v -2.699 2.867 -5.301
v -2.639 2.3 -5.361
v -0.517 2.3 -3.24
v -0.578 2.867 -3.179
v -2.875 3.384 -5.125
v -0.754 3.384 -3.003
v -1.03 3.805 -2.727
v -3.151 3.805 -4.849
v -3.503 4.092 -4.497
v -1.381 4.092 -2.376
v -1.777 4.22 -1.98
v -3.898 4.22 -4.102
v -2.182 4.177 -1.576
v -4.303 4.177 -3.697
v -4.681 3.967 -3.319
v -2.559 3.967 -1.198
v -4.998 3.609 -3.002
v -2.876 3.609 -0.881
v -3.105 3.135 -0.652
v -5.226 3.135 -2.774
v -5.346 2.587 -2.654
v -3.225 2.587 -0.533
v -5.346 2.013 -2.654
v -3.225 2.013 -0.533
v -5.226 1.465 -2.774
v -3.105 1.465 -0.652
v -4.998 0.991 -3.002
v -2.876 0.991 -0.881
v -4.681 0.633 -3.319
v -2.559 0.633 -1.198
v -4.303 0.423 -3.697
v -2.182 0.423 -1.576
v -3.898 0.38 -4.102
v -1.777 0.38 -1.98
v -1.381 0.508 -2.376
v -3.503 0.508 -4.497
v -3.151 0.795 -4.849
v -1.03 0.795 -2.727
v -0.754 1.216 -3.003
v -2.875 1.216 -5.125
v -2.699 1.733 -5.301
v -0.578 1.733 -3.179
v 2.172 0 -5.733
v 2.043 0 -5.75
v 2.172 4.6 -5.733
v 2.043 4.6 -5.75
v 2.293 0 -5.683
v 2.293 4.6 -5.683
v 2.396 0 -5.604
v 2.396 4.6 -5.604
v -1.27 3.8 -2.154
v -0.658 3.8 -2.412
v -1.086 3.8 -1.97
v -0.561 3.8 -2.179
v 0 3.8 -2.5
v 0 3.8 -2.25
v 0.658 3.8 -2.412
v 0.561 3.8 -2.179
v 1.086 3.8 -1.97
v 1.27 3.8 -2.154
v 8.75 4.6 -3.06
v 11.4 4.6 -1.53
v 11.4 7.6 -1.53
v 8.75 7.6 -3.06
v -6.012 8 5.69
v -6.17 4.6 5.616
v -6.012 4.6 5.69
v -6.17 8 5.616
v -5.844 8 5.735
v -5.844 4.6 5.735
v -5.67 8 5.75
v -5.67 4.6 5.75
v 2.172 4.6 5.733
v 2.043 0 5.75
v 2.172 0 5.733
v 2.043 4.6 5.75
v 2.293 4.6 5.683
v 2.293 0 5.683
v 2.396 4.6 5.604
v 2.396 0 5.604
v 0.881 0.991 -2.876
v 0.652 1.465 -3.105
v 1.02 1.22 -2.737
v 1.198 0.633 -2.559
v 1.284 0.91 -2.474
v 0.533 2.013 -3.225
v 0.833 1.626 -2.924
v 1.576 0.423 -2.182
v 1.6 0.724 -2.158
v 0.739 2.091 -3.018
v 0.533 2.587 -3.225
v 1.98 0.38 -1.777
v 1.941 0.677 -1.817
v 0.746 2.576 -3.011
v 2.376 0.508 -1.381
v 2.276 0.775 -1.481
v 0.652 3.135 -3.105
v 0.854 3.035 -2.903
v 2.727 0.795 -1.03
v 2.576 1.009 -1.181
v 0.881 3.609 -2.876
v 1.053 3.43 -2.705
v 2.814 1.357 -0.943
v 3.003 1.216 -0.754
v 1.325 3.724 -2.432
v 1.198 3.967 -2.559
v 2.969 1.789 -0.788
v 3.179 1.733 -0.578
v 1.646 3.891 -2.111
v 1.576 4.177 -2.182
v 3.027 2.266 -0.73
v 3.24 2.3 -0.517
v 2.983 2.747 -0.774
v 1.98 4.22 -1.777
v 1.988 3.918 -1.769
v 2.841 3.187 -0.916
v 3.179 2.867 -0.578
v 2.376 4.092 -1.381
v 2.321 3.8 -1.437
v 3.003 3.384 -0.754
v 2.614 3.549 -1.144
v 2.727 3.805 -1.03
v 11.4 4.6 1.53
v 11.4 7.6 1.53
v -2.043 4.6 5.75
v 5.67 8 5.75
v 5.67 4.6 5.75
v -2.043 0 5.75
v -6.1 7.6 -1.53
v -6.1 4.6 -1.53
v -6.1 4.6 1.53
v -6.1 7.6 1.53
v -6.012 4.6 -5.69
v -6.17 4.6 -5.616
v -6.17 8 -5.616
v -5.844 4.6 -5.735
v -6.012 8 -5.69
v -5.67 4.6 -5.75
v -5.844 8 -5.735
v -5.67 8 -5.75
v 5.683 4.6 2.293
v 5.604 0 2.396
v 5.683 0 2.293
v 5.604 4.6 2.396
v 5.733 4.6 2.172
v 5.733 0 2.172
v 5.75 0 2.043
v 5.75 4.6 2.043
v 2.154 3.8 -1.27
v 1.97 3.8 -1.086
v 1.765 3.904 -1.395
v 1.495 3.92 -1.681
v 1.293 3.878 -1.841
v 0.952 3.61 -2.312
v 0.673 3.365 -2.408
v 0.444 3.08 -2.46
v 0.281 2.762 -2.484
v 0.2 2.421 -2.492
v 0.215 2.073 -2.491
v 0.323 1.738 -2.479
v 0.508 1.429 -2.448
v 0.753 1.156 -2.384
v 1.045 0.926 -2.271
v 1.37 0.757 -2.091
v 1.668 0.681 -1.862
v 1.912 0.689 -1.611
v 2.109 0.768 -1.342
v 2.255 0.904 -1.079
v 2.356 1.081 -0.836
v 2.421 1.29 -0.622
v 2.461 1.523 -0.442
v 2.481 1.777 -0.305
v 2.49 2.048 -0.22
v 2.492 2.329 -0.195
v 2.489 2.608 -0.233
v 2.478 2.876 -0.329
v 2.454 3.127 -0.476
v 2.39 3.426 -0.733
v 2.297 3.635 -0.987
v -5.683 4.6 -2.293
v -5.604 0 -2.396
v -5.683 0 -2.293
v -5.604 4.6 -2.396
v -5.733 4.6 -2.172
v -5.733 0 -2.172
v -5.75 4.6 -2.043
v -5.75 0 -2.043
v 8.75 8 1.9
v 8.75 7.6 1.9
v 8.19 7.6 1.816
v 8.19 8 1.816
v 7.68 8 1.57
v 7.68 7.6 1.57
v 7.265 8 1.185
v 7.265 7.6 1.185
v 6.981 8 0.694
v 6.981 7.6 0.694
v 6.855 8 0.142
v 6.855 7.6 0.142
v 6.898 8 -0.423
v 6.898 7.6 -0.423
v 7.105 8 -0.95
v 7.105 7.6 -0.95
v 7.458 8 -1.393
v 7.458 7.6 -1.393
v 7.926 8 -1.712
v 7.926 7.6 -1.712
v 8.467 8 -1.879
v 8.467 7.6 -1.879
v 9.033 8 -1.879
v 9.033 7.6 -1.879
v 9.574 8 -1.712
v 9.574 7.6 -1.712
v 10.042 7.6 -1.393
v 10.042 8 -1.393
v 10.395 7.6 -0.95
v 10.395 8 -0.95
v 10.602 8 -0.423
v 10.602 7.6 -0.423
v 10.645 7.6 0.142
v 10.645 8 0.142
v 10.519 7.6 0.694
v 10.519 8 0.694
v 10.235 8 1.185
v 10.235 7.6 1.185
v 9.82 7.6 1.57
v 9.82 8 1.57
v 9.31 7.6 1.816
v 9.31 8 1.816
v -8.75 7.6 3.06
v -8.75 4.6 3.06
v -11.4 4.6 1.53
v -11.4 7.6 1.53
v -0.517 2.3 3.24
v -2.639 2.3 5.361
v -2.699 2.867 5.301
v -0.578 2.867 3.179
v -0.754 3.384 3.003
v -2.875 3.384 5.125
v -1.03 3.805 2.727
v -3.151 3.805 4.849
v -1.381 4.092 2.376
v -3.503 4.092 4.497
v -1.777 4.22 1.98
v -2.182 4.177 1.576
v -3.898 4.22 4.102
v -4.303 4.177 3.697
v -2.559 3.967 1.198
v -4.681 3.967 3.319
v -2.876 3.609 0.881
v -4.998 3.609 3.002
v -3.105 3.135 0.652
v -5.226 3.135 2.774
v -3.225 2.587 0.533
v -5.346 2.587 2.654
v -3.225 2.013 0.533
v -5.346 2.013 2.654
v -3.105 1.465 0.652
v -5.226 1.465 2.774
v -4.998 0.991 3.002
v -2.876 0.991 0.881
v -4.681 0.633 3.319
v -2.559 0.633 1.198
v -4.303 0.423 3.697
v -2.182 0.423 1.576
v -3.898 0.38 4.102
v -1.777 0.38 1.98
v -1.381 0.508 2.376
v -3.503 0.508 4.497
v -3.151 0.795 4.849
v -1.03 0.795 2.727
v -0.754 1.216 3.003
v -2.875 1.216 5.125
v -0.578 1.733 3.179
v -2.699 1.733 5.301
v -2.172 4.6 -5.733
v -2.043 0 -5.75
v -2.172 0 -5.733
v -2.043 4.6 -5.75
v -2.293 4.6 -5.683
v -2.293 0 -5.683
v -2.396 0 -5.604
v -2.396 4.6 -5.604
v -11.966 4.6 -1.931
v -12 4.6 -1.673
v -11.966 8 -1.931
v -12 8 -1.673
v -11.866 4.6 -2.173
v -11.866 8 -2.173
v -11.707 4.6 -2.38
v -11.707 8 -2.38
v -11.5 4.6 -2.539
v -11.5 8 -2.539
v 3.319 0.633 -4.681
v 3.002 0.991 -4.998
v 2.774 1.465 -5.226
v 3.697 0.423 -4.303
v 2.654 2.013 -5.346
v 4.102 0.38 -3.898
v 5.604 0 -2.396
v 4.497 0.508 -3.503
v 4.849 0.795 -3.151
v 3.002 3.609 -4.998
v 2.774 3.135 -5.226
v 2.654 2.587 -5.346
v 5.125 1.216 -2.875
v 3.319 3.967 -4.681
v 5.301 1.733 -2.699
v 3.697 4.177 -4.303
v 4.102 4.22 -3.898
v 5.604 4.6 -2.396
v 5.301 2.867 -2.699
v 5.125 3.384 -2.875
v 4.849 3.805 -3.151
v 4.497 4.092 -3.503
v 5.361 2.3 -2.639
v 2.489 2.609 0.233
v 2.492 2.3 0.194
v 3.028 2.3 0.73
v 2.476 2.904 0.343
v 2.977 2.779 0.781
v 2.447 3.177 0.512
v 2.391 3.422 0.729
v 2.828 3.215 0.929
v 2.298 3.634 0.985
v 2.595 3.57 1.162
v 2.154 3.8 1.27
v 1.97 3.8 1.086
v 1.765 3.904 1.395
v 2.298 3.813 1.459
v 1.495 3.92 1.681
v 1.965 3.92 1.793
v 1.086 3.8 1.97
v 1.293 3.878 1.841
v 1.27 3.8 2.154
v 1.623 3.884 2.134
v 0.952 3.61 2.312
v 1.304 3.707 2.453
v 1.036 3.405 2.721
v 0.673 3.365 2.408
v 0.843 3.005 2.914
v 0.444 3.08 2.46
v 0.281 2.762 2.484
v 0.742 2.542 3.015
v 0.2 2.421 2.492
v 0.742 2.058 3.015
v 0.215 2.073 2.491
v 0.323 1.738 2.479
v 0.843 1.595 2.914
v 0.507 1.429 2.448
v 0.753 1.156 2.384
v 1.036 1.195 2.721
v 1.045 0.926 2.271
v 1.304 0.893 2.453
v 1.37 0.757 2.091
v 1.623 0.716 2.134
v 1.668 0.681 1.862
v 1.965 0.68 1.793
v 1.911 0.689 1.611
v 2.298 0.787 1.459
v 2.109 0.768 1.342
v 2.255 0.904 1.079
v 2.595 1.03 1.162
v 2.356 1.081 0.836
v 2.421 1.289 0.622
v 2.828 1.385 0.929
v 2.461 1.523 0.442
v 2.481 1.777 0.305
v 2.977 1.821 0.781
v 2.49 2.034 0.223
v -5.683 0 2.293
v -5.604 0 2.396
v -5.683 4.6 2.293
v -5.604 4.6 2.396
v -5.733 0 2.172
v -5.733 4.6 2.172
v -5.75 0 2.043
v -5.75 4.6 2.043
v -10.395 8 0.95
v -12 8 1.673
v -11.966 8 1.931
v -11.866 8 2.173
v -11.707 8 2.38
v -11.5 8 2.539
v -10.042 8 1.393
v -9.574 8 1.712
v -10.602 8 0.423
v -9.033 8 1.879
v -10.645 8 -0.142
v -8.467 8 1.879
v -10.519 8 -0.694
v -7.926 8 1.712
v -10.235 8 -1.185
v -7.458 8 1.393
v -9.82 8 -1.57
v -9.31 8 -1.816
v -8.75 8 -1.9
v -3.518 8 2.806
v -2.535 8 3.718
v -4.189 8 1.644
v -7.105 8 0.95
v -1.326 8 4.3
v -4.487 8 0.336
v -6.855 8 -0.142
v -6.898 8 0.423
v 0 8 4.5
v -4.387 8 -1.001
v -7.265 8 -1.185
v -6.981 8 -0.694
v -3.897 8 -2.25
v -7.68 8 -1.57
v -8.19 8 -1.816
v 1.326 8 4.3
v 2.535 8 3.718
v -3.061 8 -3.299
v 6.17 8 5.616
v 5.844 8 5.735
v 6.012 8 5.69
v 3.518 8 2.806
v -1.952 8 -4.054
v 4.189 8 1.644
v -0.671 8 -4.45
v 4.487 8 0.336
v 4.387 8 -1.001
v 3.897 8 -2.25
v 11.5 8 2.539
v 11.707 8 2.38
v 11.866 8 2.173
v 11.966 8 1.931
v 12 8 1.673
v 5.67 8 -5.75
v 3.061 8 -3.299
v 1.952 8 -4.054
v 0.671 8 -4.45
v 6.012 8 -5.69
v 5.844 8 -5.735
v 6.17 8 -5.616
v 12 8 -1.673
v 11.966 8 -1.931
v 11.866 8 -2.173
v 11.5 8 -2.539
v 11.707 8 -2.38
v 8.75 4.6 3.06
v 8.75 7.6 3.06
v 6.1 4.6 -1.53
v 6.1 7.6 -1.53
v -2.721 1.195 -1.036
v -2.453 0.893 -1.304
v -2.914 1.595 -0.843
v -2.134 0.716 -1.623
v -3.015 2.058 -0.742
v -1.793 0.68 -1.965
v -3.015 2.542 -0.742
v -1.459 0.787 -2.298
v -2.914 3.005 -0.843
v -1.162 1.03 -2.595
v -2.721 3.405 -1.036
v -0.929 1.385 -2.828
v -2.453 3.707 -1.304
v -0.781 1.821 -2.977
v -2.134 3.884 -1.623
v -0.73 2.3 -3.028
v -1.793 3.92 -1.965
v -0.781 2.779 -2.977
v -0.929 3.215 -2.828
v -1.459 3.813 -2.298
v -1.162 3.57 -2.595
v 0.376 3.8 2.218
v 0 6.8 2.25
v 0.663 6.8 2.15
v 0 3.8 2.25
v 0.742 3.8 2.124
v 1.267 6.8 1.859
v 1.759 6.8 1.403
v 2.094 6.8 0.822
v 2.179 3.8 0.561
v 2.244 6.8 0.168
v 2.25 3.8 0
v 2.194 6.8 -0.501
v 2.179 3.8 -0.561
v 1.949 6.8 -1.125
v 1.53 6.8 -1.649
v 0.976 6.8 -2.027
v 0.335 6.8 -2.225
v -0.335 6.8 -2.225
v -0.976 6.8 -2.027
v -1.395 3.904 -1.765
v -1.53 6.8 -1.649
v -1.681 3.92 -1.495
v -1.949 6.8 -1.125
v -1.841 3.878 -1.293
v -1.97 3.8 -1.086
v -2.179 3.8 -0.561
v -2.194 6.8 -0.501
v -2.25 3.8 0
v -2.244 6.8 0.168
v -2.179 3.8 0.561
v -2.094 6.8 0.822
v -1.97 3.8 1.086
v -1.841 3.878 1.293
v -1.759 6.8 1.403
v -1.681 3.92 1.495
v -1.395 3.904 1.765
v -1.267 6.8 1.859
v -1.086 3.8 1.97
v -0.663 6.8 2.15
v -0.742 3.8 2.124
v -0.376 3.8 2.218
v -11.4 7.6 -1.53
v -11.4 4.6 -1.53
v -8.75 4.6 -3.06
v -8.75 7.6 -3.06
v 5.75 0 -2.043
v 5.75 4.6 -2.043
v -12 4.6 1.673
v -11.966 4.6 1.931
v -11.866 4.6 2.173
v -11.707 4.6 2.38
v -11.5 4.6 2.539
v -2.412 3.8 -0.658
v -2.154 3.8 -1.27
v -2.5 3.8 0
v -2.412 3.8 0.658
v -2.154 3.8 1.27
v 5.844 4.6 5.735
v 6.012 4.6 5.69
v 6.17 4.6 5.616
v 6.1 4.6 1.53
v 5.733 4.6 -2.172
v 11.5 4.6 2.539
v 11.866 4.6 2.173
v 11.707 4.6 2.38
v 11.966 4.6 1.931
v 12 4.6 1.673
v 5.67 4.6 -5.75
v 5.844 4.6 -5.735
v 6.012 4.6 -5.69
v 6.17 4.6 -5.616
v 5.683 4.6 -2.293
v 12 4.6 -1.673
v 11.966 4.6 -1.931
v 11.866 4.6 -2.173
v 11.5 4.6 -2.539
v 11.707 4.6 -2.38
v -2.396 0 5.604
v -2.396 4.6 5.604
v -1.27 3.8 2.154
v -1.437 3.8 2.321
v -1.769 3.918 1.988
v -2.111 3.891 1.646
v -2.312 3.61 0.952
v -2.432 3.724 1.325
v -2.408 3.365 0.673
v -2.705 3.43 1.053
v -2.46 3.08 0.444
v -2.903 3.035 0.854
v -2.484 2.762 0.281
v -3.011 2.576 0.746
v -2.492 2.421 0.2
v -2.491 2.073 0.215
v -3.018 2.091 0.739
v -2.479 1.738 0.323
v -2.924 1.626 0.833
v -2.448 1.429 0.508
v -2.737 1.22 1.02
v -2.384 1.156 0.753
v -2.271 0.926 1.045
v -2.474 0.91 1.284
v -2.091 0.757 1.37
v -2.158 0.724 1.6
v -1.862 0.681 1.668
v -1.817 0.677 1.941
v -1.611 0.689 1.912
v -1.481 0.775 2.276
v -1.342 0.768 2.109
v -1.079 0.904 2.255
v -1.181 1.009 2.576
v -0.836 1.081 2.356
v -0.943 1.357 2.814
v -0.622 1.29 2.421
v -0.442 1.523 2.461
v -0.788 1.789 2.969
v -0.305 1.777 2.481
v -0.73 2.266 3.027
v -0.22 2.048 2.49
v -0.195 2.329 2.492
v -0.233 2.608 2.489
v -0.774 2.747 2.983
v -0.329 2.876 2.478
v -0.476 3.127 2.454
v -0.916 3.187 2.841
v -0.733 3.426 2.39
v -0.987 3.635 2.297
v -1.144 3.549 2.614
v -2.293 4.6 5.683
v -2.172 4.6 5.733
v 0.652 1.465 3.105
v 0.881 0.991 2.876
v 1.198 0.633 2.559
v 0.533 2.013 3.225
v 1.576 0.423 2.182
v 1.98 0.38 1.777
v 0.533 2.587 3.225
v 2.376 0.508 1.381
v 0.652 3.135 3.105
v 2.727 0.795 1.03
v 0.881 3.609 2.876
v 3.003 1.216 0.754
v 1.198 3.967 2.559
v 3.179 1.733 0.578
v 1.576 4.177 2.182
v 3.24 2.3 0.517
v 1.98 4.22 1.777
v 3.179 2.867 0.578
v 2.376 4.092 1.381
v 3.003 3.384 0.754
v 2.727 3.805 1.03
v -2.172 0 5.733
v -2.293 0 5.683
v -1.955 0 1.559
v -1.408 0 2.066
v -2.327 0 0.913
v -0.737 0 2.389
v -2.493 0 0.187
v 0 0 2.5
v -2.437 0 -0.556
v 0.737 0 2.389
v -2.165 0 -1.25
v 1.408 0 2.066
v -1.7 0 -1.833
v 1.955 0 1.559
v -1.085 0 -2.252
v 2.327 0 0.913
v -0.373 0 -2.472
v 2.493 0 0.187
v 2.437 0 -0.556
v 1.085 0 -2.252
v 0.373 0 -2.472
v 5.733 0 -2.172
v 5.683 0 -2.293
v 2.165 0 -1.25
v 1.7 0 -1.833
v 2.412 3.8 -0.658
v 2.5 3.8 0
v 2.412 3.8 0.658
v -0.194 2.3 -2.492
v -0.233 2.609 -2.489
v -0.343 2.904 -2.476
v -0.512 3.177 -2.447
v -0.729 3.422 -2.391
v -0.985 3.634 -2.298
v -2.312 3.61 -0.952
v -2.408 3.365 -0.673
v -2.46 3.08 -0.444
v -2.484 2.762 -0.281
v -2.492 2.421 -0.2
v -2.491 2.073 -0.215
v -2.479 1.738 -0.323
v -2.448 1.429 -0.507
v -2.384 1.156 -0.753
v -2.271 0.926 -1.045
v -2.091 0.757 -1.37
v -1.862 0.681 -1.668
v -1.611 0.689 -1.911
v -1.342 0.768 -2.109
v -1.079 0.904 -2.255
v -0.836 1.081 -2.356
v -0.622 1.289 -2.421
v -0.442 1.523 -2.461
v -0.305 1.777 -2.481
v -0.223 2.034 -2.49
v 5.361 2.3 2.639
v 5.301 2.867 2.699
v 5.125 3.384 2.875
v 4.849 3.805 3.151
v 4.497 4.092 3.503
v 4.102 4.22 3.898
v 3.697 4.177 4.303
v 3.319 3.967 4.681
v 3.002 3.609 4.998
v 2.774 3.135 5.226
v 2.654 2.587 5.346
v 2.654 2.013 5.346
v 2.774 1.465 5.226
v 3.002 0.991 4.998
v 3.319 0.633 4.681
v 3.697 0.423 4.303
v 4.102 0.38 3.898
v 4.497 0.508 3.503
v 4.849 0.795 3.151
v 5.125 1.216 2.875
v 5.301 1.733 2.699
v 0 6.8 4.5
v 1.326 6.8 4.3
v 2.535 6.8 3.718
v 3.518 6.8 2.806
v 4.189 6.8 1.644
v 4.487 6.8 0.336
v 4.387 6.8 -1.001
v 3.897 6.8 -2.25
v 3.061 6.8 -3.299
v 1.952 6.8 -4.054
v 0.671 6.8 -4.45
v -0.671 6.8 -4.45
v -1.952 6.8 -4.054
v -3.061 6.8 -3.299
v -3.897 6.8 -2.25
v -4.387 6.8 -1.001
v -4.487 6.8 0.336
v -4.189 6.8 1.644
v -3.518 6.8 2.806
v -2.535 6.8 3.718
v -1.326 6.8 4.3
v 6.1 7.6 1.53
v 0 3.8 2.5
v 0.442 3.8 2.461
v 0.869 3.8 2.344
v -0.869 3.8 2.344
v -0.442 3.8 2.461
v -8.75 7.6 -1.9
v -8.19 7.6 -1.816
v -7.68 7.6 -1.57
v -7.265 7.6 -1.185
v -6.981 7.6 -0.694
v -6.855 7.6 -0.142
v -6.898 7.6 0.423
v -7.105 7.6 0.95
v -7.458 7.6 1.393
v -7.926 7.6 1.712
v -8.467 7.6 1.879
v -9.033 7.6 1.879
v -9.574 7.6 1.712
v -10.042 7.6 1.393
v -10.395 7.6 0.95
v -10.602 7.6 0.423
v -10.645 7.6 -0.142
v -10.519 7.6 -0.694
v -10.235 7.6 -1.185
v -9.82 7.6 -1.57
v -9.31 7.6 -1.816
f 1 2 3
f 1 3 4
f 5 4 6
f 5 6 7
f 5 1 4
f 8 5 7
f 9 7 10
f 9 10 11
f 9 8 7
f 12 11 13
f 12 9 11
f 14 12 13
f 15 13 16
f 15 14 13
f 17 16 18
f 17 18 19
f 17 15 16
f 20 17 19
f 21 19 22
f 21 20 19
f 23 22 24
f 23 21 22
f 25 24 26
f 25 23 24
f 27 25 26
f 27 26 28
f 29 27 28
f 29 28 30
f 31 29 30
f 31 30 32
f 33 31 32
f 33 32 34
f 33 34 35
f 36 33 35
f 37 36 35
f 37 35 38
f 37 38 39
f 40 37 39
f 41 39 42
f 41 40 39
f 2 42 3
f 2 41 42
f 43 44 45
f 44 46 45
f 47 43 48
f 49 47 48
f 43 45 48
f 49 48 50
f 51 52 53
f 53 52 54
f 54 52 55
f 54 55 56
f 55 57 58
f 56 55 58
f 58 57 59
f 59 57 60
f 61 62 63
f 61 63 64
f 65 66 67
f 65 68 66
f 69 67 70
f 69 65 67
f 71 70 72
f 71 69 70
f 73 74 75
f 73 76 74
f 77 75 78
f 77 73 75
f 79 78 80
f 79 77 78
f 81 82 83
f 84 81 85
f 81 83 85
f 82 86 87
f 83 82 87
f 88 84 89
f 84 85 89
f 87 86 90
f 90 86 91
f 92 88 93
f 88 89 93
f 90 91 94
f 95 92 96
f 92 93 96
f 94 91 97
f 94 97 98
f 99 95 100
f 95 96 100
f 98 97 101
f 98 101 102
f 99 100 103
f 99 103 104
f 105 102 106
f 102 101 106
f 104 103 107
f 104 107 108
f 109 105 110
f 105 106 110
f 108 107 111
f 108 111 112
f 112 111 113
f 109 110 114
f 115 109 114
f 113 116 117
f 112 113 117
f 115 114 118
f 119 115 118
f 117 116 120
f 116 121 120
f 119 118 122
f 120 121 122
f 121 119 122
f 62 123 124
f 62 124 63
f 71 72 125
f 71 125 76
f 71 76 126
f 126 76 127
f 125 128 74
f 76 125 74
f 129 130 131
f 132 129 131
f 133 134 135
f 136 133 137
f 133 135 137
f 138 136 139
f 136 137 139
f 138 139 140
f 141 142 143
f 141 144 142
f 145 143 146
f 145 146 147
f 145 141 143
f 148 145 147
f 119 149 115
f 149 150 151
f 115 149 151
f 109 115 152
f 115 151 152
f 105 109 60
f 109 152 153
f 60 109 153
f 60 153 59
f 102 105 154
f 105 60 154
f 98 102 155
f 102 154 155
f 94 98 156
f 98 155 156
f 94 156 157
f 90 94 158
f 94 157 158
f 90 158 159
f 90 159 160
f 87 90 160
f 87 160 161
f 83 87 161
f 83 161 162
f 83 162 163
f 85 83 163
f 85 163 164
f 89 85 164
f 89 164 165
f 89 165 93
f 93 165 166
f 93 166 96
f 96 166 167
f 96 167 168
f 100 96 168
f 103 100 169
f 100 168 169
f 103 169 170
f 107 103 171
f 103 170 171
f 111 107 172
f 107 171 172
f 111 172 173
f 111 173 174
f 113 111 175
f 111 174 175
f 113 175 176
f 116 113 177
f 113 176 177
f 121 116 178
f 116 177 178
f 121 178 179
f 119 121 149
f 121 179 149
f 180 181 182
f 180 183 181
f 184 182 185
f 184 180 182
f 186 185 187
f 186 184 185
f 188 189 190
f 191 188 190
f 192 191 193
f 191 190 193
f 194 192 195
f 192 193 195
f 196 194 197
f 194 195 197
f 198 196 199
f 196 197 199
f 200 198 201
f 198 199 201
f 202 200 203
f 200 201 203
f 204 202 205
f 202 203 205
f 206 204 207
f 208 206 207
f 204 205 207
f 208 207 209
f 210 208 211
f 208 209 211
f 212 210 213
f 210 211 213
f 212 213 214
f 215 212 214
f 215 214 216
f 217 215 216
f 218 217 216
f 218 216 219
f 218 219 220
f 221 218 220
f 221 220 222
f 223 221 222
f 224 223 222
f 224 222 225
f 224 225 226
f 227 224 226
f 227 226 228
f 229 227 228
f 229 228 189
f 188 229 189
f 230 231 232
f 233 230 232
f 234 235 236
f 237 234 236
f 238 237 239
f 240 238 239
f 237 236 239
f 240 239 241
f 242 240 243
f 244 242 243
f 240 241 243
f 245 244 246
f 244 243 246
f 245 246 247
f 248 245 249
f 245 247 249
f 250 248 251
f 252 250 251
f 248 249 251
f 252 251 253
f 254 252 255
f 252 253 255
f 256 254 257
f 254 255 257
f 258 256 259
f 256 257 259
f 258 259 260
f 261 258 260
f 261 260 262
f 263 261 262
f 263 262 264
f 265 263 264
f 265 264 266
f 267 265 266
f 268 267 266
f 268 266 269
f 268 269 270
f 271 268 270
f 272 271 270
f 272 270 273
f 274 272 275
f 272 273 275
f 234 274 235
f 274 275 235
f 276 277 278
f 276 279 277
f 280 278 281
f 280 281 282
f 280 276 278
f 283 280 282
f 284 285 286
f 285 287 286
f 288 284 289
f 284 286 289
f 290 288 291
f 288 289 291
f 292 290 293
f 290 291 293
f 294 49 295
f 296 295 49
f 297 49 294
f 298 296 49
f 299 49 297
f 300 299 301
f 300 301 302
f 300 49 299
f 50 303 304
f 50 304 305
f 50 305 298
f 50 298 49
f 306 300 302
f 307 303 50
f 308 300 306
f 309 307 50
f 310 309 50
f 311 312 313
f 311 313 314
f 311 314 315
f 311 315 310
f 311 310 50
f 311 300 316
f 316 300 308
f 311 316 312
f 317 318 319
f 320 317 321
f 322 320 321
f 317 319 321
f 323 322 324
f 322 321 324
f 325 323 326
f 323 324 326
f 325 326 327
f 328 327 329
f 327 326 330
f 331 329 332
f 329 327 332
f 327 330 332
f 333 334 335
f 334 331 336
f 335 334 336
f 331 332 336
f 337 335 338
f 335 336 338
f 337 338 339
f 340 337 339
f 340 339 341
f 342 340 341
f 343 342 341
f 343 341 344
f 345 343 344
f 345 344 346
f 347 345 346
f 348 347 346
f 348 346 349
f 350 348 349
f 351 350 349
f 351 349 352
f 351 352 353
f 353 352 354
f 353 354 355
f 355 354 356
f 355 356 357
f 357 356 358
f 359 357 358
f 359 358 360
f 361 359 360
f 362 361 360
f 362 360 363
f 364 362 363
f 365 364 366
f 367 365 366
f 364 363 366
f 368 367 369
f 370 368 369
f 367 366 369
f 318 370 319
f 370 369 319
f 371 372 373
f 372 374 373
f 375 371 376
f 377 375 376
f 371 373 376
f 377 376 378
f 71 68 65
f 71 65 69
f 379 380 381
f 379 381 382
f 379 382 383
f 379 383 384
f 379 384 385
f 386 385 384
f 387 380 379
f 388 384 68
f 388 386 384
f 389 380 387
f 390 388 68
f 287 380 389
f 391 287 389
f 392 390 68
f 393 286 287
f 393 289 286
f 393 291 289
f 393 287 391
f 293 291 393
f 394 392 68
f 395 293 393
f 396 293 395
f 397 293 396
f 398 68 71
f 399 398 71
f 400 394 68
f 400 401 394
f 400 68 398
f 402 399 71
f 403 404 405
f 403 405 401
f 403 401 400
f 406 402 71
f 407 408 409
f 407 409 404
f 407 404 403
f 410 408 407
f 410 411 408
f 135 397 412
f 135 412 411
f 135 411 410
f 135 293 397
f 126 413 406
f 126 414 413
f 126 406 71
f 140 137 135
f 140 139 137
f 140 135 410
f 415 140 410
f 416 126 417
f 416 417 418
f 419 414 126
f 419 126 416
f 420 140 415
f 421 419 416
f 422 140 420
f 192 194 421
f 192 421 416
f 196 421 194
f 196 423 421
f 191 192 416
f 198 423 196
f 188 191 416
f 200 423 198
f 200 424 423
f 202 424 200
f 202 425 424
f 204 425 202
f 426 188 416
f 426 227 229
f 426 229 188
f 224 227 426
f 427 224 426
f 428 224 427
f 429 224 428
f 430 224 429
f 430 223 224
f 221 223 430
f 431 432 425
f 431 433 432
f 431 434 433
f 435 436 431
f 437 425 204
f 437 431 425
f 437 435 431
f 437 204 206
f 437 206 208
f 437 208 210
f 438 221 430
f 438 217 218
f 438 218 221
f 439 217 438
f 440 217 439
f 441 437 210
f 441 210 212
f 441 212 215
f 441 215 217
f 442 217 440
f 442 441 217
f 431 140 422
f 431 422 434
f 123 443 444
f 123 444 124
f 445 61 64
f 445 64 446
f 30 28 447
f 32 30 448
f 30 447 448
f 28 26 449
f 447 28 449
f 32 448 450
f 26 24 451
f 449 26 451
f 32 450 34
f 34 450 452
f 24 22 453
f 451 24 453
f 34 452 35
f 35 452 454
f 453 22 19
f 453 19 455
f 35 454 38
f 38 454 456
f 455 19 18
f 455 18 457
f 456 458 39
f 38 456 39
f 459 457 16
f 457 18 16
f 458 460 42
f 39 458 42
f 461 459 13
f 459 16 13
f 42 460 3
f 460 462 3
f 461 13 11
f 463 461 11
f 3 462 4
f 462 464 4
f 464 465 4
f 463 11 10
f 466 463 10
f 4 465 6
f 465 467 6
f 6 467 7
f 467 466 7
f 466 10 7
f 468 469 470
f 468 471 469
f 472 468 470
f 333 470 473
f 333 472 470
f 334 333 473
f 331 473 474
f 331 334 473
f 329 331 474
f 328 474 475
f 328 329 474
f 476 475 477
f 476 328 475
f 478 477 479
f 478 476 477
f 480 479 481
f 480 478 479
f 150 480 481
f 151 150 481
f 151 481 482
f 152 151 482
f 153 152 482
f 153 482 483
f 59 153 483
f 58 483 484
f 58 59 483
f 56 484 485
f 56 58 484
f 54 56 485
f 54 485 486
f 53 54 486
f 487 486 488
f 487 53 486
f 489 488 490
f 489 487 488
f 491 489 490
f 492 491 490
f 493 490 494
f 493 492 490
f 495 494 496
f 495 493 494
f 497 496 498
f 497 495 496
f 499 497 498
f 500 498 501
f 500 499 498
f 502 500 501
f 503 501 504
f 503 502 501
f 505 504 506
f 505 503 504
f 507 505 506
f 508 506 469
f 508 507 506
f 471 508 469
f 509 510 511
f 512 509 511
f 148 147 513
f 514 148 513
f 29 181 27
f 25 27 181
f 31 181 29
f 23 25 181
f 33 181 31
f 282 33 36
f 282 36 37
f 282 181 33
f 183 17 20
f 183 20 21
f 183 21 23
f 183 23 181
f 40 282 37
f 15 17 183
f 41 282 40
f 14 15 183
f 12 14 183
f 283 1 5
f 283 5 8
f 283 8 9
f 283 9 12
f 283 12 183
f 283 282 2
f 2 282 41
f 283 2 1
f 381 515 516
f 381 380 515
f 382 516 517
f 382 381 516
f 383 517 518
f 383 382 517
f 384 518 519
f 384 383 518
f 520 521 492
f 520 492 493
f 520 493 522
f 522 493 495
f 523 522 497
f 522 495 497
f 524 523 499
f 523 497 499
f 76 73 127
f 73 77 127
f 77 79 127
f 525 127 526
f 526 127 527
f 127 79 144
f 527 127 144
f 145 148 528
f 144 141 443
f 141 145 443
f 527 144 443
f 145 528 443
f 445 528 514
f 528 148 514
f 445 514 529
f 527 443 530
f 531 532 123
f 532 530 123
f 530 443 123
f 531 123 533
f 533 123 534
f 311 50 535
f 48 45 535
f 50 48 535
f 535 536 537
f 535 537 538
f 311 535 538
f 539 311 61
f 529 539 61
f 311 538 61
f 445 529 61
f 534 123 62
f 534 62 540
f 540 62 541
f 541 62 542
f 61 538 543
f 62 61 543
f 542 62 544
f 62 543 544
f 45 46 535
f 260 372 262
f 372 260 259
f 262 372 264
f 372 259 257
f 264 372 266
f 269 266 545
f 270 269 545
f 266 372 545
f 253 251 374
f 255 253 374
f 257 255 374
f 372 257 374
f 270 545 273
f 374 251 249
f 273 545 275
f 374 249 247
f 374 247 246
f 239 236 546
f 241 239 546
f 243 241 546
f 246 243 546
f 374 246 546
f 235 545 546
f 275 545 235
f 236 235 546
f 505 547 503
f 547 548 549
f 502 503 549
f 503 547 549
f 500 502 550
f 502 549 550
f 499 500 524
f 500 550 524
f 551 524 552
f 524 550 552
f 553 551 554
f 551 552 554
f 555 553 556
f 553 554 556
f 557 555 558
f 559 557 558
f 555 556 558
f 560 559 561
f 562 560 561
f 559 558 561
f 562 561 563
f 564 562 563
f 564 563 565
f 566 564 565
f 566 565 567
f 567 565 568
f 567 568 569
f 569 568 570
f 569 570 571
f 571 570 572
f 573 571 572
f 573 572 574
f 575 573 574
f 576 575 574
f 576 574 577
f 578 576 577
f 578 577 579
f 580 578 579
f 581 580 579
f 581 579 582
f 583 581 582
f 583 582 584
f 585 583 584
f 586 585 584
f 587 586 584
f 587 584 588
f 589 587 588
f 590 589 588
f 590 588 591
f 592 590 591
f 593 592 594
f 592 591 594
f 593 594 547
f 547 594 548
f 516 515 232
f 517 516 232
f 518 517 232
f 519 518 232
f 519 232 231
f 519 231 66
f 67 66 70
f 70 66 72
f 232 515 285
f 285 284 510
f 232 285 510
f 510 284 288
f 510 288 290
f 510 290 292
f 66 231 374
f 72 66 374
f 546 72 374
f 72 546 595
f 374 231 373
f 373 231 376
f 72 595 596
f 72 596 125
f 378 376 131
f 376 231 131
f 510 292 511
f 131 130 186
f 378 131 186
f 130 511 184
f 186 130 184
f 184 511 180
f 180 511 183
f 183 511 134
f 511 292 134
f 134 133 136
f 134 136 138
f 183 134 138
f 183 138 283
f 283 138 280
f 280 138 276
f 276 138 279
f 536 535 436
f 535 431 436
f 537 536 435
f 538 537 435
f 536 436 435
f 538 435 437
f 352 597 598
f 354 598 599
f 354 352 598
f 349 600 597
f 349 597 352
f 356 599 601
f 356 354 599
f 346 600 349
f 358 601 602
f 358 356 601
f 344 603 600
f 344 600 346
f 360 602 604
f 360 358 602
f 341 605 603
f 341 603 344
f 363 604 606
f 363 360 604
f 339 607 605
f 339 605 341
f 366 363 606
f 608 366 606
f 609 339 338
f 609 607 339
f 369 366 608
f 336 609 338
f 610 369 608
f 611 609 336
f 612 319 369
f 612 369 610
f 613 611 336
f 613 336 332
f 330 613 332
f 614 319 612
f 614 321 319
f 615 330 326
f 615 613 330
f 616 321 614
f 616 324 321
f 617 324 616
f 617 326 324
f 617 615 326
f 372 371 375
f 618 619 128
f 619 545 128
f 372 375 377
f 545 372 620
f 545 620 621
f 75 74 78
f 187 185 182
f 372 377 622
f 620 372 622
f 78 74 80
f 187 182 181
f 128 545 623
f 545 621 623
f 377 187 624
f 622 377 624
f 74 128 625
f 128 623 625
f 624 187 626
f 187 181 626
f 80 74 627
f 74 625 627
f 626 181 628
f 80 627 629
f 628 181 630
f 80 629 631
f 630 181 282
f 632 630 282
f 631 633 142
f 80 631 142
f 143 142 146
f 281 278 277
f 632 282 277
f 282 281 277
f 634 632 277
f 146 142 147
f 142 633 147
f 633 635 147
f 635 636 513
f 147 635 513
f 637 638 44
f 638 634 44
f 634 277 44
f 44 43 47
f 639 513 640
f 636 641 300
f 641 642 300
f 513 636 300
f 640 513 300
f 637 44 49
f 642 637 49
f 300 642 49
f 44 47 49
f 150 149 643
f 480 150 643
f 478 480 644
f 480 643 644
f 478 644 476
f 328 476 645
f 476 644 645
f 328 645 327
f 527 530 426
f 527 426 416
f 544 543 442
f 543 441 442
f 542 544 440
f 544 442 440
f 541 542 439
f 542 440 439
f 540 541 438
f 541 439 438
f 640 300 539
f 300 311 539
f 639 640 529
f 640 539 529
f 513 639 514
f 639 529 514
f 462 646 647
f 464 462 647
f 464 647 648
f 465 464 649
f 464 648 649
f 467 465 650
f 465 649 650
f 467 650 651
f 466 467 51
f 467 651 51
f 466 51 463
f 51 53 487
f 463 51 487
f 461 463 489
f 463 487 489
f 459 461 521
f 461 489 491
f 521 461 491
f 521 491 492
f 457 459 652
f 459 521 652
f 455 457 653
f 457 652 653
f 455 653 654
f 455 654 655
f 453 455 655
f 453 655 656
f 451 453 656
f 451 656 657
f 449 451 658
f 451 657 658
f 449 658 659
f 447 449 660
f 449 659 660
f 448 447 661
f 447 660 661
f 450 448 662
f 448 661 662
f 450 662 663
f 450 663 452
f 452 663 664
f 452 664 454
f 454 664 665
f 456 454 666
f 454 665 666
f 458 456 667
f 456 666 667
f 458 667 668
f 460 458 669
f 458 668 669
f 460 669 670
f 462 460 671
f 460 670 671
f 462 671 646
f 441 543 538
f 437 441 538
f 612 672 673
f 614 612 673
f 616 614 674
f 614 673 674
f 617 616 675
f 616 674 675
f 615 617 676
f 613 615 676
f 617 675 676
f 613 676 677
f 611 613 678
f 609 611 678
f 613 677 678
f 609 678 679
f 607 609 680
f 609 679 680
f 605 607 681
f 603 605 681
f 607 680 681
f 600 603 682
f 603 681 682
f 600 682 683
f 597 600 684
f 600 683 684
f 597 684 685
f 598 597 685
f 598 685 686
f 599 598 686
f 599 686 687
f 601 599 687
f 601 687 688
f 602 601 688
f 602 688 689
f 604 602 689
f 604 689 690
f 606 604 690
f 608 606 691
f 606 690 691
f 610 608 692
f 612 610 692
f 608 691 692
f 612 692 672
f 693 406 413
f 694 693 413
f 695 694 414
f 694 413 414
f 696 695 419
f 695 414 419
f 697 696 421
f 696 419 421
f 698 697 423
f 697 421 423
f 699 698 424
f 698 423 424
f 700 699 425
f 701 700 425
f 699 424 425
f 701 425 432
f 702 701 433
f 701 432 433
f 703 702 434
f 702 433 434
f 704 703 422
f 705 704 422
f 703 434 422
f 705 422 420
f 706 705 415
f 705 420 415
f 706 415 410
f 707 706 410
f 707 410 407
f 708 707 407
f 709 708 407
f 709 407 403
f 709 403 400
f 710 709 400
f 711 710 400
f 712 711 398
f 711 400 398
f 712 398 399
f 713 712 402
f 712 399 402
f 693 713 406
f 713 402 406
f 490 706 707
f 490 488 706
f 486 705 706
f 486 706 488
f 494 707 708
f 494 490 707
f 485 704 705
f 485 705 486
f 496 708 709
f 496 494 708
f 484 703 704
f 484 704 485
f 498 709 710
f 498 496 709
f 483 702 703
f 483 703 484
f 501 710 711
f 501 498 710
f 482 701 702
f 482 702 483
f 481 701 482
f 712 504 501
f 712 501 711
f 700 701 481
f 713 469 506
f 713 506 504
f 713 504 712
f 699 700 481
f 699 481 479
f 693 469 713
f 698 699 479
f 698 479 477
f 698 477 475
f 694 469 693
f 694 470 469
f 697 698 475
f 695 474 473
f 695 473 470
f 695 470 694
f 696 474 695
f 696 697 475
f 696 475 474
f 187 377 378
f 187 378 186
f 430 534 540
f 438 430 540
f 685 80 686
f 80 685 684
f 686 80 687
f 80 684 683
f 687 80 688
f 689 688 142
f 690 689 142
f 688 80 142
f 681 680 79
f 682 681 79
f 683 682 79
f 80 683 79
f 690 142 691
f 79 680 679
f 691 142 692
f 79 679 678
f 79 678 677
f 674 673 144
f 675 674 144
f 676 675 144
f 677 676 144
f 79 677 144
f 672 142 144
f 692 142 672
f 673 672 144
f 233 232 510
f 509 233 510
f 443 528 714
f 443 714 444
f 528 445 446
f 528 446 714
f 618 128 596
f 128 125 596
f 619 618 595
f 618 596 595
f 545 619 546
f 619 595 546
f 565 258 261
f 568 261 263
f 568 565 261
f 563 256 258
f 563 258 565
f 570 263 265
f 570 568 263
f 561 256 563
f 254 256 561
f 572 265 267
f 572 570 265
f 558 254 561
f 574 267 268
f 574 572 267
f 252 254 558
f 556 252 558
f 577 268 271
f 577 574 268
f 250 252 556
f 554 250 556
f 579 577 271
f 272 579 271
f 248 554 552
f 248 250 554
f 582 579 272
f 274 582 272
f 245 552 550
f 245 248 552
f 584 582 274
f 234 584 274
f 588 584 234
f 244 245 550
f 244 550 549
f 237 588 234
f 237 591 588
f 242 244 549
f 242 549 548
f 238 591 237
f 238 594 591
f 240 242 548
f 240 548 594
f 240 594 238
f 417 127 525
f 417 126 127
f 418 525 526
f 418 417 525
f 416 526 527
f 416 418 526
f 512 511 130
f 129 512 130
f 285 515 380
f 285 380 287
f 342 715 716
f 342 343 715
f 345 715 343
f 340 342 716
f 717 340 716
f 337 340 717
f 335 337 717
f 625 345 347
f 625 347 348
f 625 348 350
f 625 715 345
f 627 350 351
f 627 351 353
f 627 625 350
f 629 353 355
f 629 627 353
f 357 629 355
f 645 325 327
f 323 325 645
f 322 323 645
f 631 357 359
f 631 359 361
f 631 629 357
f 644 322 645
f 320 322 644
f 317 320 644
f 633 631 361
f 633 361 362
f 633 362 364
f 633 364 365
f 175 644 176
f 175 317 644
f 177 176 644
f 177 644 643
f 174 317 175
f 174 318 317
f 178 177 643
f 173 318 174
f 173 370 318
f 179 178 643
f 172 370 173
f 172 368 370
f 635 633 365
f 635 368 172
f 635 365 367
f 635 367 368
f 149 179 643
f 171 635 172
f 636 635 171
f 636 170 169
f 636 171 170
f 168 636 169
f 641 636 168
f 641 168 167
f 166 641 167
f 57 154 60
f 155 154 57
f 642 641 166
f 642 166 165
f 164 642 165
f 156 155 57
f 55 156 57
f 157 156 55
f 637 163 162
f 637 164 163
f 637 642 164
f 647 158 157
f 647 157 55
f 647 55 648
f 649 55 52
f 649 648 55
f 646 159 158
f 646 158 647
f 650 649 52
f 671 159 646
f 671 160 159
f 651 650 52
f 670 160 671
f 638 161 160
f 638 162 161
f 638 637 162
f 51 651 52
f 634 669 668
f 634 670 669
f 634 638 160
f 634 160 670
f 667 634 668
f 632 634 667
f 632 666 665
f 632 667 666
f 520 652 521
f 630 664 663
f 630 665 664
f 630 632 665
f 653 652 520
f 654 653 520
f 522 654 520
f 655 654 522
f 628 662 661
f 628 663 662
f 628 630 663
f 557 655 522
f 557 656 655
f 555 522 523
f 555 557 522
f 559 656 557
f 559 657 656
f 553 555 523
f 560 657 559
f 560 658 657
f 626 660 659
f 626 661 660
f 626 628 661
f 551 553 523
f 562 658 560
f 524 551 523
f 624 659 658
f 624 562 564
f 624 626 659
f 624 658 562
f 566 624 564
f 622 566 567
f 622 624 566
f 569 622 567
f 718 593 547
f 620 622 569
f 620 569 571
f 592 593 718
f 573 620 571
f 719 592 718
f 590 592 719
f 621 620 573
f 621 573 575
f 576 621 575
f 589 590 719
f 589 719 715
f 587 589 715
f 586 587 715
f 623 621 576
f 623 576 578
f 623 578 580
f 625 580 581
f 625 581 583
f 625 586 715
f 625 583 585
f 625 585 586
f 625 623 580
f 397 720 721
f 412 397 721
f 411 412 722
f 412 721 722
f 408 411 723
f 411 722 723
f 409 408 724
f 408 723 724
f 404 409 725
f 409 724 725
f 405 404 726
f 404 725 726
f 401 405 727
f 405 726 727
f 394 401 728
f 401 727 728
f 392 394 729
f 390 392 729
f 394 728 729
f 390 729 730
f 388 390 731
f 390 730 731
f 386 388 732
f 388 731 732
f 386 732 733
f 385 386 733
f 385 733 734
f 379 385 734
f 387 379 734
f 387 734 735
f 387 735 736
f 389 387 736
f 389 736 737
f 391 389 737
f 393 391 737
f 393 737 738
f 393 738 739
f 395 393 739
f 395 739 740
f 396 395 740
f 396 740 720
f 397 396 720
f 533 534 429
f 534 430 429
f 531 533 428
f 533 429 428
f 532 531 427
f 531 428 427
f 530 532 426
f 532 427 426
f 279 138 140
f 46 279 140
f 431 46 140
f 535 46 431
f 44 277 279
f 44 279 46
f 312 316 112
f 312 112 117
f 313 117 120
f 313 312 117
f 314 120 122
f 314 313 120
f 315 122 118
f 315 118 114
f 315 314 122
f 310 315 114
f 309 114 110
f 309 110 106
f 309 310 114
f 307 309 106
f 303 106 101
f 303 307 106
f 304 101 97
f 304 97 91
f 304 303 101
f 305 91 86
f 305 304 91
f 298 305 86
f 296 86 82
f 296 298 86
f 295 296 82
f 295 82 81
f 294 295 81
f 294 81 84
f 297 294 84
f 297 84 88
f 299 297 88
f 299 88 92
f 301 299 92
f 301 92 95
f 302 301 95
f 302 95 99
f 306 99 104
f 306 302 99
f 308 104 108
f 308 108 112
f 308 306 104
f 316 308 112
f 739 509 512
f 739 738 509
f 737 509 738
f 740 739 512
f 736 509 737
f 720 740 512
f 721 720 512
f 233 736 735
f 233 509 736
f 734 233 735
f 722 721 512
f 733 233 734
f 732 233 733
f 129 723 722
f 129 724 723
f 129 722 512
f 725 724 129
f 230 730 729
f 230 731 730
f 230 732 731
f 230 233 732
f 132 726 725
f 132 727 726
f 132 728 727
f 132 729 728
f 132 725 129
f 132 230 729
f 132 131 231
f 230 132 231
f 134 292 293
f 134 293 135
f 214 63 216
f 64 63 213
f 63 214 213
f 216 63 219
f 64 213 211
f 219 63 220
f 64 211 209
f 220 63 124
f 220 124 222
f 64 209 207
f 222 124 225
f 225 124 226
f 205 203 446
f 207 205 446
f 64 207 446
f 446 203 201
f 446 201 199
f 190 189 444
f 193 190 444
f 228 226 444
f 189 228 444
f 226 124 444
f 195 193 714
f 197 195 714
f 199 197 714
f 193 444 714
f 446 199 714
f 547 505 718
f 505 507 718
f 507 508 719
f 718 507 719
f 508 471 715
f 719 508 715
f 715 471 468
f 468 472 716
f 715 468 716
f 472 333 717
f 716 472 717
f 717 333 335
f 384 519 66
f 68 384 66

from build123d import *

# Parameters (mm, degrees)
ESBO_O10_W               = 11.5
ESBO_O10_H               = 11.5
ESBO_O10_R               = 2.5
RESSALTO_EXTRUS_O4_DEPTH = 8
CHANFRO2_SIZE            = 3.5
ESBO_O12_R               = 1.925
CORTE_EXTRUS_O4_DEPTH    = 3
ESBO_O17_R               = 1.925
CORTE_EXTRUS_O5_DEPTH    = 3
RESSALTO_EXTRUS_O5_START = -4.2
ESBO_O18_R               = 2.5
ESBO_O18_R_2             = 2.25
RESSALTO_EXTRUS_O5_DEPTH = 4.2
ESBO_O19_R               = 1.625
CORTE_EXTRUS_O6_DEPTH    = 14.431064984
ESBO_O20_R               = 1.625
CORTE_EXTRUS_O7_DEPTH    = 14.431065043
RESSALTO_EXTRUS_O6_START = -3.4
ESBO_O24_W               = 24
ESBO_O24_H               = 11.5
ESBO_O24_R               = 2.25
RESSALTO_EXTRUS_O6_DEPTH = 3.4
CORTE_EXTRUS_O8_DEPTH    = 3
ESBO_O26_R               = 1.9
CORTE_EXTRUS_O9_DEPTH    = 16.323919261
CORTE_EXTRUS_O10_DEPTH   = 15.079151286
FILETE3_R                = 1
FILETE4_R                = 0.5
ESBO_O30_R               = 4.5
CORTE_EXTRUS_O11_DEPTH   = 1.2


with BuildPart() as part:
    # Esboço10 → Ressalto-extrusão4 (new body)
    with BuildSketch(Plane(origin=(0, 0, 0), x_dir=(1, 0, 0), z_dir=(0, 1, 0))):
        Rectangle(ESBO_O10_W, ESBO_O10_H)
        with Locations(Location((0, 0, 0), (0, 0, 270))):
            Circle(ESBO_O10_R, mode=Mode.SUBTRACT)
    extrude(amount=RESSALTO_EXTRUS_O4_DEPTH)

    # Chanfro2
    chanfro2_edges = [part.edges().sort_by_distance(p)[0] for p in [
        (5.75, 4, 5.75),
        (-5.75, 4, 5.75),
        (-5.75, 4, -5.75),
        (5.75, 4, -5.75),
    ]]
    chamfer(chanfro2_edges, length=CHANFRO2_SIZE)

    # Esboço12 → Corte-extrusão4 (cut)
    with BuildSketch(Plane(origin=(-4, 0, 4), x_dir=(0.7071067811865465, 0, 0.7071067811865487), z_dir=(-0.7071067811865487, 0, 0.7071067811865465))):
        with Locations((0, 2.3)):
            Circle(ESBO_O12_R)
    corte_extrus_o4 = extrude(amount=-CORTE_EXTRUS_O4_DEPTH, mode=Mode.SUBTRACT)

    # Esboço17 → Corte-extrusão5 (cut)
    with BuildSketch(Plane(origin=(4, 0, 4), x_dir=(0.7071067811865489, 0, -0.7071067811865462), z_dir=(0.7071067811865462, 0, 0.7071067811865489))):
        with Locations((0, 2.3)):
            Circle(ESBO_O17_R)
    corte_extrus_o5 = extrude(amount=-CORTE_EXTRUS_O5_DEPTH, mode=Mode.SUBTRACT)

    # Espelhar1: Corte-extrusão4 across plane
    add(corte_extrus_o4.mirror(Plane.XY), mode=Mode.SUBTRACT)

    # Espelhar2: Corte-extrusão5 across plane
    add(corte_extrus_o5.mirror(Plane.XY), mode=Mode.SUBTRACT)

    # Esboço18 → Ressalto-extrusão5 (add)
    with BuildSketch(Plane(origin=(0, 8, 0), x_dir=(1, 0, 0), z_dir=(0, 1, 0)).offset(RESSALTO_EXTRUS_O5_START)):
        with Locations(Location((0, 0, 0), (0, 0, 270))):
            Circle(ESBO_O18_R)
        with Locations(Location((0, 0, 0), (0, 0, 270))):
            Circle(ESBO_O18_R_2, mode=Mode.SUBTRACT)
    extrude(amount=RESSALTO_EXTRUS_O5_DEPTH)

    # Esboço19 → Corte-extrusão6 (cut, through all)
    with BuildSketch(Plane(origin=(-1.878679656, 0, 1.878679656), x_dir=(0.7071067811865465, 0, 0.7071067811865486), z_dir=(-0.7071067811865486, 0, 0.7071067811865465))):
        with Locations(Location((0, 2.3, 0), (0, 0, 67.380135052))):
            Circle(ESBO_O19_R)
    extrude(amount=-CORTE_EXTRUS_O6_DEPTH, mode=Mode.SUBTRACT)

    # Esboço20 → Corte-extrusão7 (cut, through all)
    with BuildSketch(Plane(origin=(1.878679656, 0, 1.878679656), x_dir=(0.7071067811865488, 0, -0.7071067811865464), z_dir=(0.7071067811865464, 0, 0.7071067811865488))):
        with Locations((0, 2.3)):
            Circle(ESBO_O20_R)
    extrude(amount=-CORTE_EXTRUS_O7_DEPTH, mode=Mode.SUBTRACT)

    # Esboço24 → Ressalto-extrusão6 (add)
    with BuildSketch(Plane(origin=(0, 8, 0), x_dir=(1, 0, 0), z_dir=(0, 1, 0)).offset(RESSALTO_EXTRUS_O6_START)):
        Rectangle(ESBO_O24_W, ESBO_O24_H)
        with Locations(Location((0, 0, 0), (0, 0, 270))):
            Circle(ESBO_O24_R, mode=Mode.SUBTRACT)
    extrude(amount=RESSALTO_EXTRUS_O6_DEPTH)

    # Esboço25 → Corte-extrusão8 (cut)
    with BuildSketch(Plane.XZ.offset(-4.6)):
        Polygon((-8.75, 3.059956427), (-11.4, 1.529978213), (-11.4, -1.529978213), (-8.75, -3.059956427), (-6.1, -1.529978213), (-6.1, 1.529978213), align=None)
        Polygon((6.1, 1.529978213), (8.75, 3.059956427), (11.4, 1.529978213), (11.4, -1.529978213), (8.75, -3.059956427), (6.1, -1.529978213), align=None)
    extrude(amount=-CORTE_EXTRUS_O8_DEPTH, mode=Mode.SUBTRACT)

    # Esboço26 → Corte-extrusão9 (cut, through all)
    with BuildSketch(Plane.XZ.offset(-7.6)):
        with Locations(Location((-8.75, 0, 0), (0, 0, 270))):
            Circle(ESBO_O26_R)
        with Locations(Location((8.75, 0, 0), (0, 0, 90))):
            Circle(ESBO_O26_R)
    extrude(amount=-CORTE_EXTRUS_O9_DEPTH, mode=Mode.SUBTRACT)

    # Esboço27 → Corte-extrusão10 (cut, through all)
    with BuildSketch(Plane.XZ.offset(-4.6)):
        Polygon((-12, 5.75), (-12, 2.25), (-5.937822174, 5.75), align=None)
        Polygon((-5.937822174, -5.75), (-12, -5.75), (-12, -2.25), align=None)
        Polygon((12, -5.75), (12, -2.25), (5.937822174, -5.75), align=None)
        Polygon((5.937822174, 5.75), (12, 5.75), (12, 2.25), align=None)
    extrude(amount=-CORTE_EXTRUS_O10_DEPTH, mode=Mode.SUBTRACT)

    # Filete3
    filete3_edges = [part.edges().sort_by_distance(p)[0] for p in [
        (12, 6.3, 2.25),
        (5.937822174, 6.3, 5.75),
        (5.937822174, 6.3, -5.75),
        (12, 6.3, -2.25),
        (-12, 6.3, -2.25),
        (-5.937822174, 6.3, -5.75),
        (-5.937822174, 6.3, 5.75),
        (-12, 6.3, 2.25),
    ]]
    fillet(filete3_edges, radius=FILETE3_R)

    # Filete4
    filete4_edges = [part.edges().sort_by_distance(p)[0] for p in [
        (-2.25, 2.3, 5.75),
        (-5.75, 2.3, -2.25),
        (5.75, 2.3, 2.25),
        (2.25, 2.3, -5.75),
        (-2.25, 2.3, -5.75),
        (5.75, 2.3, -2.25),
        (2.25, 2.3, 5.75),
        (-5.75, 2.3, 2.25),
    ]]
    fillet(filete4_edges, radius=FILETE4_R)

    # Esboço30 → Corte-extrusão11 (cut)
    with BuildSketch(Plane(origin=(0, 8, 0), x_dir=(1, 0, 0), z_dir=(0, 1, 0))):
        with Locations(Location((0, 0, 0), (0, 0, 270))):
            Circle(ESBO_O30_R)
    extrude(amount=-CORTE_EXTRUS_O11_DEPTH, mode=Mode.SUBTRACT)


solid = part.part
